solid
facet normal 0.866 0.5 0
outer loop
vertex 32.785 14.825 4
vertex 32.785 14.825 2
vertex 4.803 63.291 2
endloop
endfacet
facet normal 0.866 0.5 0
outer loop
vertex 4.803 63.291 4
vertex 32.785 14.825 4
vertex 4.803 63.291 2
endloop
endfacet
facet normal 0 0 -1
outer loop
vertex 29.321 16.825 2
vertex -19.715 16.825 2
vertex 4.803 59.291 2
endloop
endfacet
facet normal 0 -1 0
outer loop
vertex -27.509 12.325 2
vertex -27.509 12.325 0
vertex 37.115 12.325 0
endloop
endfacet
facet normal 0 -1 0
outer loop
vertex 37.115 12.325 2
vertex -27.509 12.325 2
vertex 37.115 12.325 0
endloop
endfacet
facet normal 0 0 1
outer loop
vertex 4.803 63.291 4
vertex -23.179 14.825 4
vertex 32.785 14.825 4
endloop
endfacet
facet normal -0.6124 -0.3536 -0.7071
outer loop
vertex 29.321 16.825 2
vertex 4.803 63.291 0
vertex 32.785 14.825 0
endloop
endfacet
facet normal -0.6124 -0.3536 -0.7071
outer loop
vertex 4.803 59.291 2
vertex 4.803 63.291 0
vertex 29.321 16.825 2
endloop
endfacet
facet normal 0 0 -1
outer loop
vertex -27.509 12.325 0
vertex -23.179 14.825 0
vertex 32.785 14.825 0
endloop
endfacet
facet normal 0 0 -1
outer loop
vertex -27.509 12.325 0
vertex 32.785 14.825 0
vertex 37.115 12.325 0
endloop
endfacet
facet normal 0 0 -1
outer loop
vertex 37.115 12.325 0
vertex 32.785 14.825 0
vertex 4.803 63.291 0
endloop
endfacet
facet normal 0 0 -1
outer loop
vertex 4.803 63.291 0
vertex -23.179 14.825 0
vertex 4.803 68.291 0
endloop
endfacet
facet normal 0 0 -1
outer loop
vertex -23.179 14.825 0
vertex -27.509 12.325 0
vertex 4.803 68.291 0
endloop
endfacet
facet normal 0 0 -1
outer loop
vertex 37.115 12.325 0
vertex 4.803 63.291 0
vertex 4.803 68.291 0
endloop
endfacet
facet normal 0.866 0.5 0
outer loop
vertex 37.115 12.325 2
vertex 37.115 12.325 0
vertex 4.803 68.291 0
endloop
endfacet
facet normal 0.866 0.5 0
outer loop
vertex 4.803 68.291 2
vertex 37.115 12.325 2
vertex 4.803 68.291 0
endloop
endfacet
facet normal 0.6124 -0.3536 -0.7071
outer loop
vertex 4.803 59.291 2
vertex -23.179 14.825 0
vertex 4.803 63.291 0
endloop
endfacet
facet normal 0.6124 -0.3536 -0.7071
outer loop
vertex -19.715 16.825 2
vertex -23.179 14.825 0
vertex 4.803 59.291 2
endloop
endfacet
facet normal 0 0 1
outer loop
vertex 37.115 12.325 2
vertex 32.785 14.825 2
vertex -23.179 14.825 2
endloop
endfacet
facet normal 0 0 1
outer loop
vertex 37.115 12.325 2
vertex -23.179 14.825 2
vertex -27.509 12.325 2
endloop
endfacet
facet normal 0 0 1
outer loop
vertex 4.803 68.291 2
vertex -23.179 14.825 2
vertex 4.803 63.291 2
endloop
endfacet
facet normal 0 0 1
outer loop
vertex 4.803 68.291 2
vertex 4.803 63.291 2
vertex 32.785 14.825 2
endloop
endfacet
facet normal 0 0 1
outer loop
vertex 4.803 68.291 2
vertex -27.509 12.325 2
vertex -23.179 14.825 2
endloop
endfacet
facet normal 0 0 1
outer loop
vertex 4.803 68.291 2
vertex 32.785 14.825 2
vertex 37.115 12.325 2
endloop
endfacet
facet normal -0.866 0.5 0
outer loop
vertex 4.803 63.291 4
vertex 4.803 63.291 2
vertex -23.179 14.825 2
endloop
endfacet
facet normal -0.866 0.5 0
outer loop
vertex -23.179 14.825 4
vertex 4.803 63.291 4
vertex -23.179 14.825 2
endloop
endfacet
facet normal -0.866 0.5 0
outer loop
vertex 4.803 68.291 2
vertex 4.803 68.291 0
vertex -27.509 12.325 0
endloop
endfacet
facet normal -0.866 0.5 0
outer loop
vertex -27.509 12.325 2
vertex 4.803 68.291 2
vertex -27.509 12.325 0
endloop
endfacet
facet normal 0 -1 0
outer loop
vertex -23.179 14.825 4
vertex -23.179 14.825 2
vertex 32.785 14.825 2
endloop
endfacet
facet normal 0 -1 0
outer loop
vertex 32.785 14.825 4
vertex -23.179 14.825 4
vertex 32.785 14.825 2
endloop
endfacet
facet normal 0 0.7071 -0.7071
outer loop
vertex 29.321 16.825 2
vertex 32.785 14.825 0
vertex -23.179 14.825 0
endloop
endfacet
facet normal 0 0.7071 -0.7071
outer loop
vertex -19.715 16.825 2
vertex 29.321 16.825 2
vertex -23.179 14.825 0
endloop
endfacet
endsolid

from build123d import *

# Parameters (mm, degrees)
F1_DEPTH = 4
F2_DEPTH = 2
F3_START = 2
F3_DEPTH = 2
F4_SIZE  = 1.99999


# Not quite as in the source:
# - a fillet or chamfer is up to 0.001 mm smaller than in the source, because OpenCascade refuses the exact size


with BuildPart() as f1:
    # F0 (on Top) → F1 (new body)
    with BuildSketch(Plane.XY):
        Polygon((32.7846783229, 14.824549064), (4.8026783229, 63.2907947614), (-23.1793216771, 14.824549064), align=None)
        Polygon((-19.715220062, 16.824549064), (4.8026783229, 59.2907947614), (29.3205767077, 16.824549064), align=None, mode=Mode.SUBTRACT)
    extrude(amount=F1_DEPTH)

    # F0 (on Top) → F2 (join)
    with BuildSketch(Plane.XY):
        Polygon((37.1148053418, 12.324549064), (4.8026783229, 68.2907947614), (-27.509448696, 12.324549064), align=None)
        Polygon((-23.1793216771, 14.824549064), (4.8026783229, 63.2907947614), (32.7846783229, 14.824549064), align=None, mode=Mode.SUBTRACT)
    extrude(amount=F2_DEPTH)

    # F0 (on Top) → F3 (join)
    with BuildSketch(Plane.XY.offset(F3_START)):
        Polygon((29.3205767077, 16.824549064), (4.8026783229, 59.2907947614), (-19.715220062, 16.824549064), align=None)
    extrude(amount=F3_DEPTH)

    # F4 (size 2 in the source; OpenCascade refuses exactly that, so slightly less here)
    f4_edges = [f1.edges().sort_by_distance(p)[0] for p in [
        (4.802678, 16.824549, 0),
        (-7.456271, 38.057672, 0),
        (17.061628, 38.057672, 0),
    ]]
    chamfer(f4_edges, length=F4_SIZE)


solid = f1.part
